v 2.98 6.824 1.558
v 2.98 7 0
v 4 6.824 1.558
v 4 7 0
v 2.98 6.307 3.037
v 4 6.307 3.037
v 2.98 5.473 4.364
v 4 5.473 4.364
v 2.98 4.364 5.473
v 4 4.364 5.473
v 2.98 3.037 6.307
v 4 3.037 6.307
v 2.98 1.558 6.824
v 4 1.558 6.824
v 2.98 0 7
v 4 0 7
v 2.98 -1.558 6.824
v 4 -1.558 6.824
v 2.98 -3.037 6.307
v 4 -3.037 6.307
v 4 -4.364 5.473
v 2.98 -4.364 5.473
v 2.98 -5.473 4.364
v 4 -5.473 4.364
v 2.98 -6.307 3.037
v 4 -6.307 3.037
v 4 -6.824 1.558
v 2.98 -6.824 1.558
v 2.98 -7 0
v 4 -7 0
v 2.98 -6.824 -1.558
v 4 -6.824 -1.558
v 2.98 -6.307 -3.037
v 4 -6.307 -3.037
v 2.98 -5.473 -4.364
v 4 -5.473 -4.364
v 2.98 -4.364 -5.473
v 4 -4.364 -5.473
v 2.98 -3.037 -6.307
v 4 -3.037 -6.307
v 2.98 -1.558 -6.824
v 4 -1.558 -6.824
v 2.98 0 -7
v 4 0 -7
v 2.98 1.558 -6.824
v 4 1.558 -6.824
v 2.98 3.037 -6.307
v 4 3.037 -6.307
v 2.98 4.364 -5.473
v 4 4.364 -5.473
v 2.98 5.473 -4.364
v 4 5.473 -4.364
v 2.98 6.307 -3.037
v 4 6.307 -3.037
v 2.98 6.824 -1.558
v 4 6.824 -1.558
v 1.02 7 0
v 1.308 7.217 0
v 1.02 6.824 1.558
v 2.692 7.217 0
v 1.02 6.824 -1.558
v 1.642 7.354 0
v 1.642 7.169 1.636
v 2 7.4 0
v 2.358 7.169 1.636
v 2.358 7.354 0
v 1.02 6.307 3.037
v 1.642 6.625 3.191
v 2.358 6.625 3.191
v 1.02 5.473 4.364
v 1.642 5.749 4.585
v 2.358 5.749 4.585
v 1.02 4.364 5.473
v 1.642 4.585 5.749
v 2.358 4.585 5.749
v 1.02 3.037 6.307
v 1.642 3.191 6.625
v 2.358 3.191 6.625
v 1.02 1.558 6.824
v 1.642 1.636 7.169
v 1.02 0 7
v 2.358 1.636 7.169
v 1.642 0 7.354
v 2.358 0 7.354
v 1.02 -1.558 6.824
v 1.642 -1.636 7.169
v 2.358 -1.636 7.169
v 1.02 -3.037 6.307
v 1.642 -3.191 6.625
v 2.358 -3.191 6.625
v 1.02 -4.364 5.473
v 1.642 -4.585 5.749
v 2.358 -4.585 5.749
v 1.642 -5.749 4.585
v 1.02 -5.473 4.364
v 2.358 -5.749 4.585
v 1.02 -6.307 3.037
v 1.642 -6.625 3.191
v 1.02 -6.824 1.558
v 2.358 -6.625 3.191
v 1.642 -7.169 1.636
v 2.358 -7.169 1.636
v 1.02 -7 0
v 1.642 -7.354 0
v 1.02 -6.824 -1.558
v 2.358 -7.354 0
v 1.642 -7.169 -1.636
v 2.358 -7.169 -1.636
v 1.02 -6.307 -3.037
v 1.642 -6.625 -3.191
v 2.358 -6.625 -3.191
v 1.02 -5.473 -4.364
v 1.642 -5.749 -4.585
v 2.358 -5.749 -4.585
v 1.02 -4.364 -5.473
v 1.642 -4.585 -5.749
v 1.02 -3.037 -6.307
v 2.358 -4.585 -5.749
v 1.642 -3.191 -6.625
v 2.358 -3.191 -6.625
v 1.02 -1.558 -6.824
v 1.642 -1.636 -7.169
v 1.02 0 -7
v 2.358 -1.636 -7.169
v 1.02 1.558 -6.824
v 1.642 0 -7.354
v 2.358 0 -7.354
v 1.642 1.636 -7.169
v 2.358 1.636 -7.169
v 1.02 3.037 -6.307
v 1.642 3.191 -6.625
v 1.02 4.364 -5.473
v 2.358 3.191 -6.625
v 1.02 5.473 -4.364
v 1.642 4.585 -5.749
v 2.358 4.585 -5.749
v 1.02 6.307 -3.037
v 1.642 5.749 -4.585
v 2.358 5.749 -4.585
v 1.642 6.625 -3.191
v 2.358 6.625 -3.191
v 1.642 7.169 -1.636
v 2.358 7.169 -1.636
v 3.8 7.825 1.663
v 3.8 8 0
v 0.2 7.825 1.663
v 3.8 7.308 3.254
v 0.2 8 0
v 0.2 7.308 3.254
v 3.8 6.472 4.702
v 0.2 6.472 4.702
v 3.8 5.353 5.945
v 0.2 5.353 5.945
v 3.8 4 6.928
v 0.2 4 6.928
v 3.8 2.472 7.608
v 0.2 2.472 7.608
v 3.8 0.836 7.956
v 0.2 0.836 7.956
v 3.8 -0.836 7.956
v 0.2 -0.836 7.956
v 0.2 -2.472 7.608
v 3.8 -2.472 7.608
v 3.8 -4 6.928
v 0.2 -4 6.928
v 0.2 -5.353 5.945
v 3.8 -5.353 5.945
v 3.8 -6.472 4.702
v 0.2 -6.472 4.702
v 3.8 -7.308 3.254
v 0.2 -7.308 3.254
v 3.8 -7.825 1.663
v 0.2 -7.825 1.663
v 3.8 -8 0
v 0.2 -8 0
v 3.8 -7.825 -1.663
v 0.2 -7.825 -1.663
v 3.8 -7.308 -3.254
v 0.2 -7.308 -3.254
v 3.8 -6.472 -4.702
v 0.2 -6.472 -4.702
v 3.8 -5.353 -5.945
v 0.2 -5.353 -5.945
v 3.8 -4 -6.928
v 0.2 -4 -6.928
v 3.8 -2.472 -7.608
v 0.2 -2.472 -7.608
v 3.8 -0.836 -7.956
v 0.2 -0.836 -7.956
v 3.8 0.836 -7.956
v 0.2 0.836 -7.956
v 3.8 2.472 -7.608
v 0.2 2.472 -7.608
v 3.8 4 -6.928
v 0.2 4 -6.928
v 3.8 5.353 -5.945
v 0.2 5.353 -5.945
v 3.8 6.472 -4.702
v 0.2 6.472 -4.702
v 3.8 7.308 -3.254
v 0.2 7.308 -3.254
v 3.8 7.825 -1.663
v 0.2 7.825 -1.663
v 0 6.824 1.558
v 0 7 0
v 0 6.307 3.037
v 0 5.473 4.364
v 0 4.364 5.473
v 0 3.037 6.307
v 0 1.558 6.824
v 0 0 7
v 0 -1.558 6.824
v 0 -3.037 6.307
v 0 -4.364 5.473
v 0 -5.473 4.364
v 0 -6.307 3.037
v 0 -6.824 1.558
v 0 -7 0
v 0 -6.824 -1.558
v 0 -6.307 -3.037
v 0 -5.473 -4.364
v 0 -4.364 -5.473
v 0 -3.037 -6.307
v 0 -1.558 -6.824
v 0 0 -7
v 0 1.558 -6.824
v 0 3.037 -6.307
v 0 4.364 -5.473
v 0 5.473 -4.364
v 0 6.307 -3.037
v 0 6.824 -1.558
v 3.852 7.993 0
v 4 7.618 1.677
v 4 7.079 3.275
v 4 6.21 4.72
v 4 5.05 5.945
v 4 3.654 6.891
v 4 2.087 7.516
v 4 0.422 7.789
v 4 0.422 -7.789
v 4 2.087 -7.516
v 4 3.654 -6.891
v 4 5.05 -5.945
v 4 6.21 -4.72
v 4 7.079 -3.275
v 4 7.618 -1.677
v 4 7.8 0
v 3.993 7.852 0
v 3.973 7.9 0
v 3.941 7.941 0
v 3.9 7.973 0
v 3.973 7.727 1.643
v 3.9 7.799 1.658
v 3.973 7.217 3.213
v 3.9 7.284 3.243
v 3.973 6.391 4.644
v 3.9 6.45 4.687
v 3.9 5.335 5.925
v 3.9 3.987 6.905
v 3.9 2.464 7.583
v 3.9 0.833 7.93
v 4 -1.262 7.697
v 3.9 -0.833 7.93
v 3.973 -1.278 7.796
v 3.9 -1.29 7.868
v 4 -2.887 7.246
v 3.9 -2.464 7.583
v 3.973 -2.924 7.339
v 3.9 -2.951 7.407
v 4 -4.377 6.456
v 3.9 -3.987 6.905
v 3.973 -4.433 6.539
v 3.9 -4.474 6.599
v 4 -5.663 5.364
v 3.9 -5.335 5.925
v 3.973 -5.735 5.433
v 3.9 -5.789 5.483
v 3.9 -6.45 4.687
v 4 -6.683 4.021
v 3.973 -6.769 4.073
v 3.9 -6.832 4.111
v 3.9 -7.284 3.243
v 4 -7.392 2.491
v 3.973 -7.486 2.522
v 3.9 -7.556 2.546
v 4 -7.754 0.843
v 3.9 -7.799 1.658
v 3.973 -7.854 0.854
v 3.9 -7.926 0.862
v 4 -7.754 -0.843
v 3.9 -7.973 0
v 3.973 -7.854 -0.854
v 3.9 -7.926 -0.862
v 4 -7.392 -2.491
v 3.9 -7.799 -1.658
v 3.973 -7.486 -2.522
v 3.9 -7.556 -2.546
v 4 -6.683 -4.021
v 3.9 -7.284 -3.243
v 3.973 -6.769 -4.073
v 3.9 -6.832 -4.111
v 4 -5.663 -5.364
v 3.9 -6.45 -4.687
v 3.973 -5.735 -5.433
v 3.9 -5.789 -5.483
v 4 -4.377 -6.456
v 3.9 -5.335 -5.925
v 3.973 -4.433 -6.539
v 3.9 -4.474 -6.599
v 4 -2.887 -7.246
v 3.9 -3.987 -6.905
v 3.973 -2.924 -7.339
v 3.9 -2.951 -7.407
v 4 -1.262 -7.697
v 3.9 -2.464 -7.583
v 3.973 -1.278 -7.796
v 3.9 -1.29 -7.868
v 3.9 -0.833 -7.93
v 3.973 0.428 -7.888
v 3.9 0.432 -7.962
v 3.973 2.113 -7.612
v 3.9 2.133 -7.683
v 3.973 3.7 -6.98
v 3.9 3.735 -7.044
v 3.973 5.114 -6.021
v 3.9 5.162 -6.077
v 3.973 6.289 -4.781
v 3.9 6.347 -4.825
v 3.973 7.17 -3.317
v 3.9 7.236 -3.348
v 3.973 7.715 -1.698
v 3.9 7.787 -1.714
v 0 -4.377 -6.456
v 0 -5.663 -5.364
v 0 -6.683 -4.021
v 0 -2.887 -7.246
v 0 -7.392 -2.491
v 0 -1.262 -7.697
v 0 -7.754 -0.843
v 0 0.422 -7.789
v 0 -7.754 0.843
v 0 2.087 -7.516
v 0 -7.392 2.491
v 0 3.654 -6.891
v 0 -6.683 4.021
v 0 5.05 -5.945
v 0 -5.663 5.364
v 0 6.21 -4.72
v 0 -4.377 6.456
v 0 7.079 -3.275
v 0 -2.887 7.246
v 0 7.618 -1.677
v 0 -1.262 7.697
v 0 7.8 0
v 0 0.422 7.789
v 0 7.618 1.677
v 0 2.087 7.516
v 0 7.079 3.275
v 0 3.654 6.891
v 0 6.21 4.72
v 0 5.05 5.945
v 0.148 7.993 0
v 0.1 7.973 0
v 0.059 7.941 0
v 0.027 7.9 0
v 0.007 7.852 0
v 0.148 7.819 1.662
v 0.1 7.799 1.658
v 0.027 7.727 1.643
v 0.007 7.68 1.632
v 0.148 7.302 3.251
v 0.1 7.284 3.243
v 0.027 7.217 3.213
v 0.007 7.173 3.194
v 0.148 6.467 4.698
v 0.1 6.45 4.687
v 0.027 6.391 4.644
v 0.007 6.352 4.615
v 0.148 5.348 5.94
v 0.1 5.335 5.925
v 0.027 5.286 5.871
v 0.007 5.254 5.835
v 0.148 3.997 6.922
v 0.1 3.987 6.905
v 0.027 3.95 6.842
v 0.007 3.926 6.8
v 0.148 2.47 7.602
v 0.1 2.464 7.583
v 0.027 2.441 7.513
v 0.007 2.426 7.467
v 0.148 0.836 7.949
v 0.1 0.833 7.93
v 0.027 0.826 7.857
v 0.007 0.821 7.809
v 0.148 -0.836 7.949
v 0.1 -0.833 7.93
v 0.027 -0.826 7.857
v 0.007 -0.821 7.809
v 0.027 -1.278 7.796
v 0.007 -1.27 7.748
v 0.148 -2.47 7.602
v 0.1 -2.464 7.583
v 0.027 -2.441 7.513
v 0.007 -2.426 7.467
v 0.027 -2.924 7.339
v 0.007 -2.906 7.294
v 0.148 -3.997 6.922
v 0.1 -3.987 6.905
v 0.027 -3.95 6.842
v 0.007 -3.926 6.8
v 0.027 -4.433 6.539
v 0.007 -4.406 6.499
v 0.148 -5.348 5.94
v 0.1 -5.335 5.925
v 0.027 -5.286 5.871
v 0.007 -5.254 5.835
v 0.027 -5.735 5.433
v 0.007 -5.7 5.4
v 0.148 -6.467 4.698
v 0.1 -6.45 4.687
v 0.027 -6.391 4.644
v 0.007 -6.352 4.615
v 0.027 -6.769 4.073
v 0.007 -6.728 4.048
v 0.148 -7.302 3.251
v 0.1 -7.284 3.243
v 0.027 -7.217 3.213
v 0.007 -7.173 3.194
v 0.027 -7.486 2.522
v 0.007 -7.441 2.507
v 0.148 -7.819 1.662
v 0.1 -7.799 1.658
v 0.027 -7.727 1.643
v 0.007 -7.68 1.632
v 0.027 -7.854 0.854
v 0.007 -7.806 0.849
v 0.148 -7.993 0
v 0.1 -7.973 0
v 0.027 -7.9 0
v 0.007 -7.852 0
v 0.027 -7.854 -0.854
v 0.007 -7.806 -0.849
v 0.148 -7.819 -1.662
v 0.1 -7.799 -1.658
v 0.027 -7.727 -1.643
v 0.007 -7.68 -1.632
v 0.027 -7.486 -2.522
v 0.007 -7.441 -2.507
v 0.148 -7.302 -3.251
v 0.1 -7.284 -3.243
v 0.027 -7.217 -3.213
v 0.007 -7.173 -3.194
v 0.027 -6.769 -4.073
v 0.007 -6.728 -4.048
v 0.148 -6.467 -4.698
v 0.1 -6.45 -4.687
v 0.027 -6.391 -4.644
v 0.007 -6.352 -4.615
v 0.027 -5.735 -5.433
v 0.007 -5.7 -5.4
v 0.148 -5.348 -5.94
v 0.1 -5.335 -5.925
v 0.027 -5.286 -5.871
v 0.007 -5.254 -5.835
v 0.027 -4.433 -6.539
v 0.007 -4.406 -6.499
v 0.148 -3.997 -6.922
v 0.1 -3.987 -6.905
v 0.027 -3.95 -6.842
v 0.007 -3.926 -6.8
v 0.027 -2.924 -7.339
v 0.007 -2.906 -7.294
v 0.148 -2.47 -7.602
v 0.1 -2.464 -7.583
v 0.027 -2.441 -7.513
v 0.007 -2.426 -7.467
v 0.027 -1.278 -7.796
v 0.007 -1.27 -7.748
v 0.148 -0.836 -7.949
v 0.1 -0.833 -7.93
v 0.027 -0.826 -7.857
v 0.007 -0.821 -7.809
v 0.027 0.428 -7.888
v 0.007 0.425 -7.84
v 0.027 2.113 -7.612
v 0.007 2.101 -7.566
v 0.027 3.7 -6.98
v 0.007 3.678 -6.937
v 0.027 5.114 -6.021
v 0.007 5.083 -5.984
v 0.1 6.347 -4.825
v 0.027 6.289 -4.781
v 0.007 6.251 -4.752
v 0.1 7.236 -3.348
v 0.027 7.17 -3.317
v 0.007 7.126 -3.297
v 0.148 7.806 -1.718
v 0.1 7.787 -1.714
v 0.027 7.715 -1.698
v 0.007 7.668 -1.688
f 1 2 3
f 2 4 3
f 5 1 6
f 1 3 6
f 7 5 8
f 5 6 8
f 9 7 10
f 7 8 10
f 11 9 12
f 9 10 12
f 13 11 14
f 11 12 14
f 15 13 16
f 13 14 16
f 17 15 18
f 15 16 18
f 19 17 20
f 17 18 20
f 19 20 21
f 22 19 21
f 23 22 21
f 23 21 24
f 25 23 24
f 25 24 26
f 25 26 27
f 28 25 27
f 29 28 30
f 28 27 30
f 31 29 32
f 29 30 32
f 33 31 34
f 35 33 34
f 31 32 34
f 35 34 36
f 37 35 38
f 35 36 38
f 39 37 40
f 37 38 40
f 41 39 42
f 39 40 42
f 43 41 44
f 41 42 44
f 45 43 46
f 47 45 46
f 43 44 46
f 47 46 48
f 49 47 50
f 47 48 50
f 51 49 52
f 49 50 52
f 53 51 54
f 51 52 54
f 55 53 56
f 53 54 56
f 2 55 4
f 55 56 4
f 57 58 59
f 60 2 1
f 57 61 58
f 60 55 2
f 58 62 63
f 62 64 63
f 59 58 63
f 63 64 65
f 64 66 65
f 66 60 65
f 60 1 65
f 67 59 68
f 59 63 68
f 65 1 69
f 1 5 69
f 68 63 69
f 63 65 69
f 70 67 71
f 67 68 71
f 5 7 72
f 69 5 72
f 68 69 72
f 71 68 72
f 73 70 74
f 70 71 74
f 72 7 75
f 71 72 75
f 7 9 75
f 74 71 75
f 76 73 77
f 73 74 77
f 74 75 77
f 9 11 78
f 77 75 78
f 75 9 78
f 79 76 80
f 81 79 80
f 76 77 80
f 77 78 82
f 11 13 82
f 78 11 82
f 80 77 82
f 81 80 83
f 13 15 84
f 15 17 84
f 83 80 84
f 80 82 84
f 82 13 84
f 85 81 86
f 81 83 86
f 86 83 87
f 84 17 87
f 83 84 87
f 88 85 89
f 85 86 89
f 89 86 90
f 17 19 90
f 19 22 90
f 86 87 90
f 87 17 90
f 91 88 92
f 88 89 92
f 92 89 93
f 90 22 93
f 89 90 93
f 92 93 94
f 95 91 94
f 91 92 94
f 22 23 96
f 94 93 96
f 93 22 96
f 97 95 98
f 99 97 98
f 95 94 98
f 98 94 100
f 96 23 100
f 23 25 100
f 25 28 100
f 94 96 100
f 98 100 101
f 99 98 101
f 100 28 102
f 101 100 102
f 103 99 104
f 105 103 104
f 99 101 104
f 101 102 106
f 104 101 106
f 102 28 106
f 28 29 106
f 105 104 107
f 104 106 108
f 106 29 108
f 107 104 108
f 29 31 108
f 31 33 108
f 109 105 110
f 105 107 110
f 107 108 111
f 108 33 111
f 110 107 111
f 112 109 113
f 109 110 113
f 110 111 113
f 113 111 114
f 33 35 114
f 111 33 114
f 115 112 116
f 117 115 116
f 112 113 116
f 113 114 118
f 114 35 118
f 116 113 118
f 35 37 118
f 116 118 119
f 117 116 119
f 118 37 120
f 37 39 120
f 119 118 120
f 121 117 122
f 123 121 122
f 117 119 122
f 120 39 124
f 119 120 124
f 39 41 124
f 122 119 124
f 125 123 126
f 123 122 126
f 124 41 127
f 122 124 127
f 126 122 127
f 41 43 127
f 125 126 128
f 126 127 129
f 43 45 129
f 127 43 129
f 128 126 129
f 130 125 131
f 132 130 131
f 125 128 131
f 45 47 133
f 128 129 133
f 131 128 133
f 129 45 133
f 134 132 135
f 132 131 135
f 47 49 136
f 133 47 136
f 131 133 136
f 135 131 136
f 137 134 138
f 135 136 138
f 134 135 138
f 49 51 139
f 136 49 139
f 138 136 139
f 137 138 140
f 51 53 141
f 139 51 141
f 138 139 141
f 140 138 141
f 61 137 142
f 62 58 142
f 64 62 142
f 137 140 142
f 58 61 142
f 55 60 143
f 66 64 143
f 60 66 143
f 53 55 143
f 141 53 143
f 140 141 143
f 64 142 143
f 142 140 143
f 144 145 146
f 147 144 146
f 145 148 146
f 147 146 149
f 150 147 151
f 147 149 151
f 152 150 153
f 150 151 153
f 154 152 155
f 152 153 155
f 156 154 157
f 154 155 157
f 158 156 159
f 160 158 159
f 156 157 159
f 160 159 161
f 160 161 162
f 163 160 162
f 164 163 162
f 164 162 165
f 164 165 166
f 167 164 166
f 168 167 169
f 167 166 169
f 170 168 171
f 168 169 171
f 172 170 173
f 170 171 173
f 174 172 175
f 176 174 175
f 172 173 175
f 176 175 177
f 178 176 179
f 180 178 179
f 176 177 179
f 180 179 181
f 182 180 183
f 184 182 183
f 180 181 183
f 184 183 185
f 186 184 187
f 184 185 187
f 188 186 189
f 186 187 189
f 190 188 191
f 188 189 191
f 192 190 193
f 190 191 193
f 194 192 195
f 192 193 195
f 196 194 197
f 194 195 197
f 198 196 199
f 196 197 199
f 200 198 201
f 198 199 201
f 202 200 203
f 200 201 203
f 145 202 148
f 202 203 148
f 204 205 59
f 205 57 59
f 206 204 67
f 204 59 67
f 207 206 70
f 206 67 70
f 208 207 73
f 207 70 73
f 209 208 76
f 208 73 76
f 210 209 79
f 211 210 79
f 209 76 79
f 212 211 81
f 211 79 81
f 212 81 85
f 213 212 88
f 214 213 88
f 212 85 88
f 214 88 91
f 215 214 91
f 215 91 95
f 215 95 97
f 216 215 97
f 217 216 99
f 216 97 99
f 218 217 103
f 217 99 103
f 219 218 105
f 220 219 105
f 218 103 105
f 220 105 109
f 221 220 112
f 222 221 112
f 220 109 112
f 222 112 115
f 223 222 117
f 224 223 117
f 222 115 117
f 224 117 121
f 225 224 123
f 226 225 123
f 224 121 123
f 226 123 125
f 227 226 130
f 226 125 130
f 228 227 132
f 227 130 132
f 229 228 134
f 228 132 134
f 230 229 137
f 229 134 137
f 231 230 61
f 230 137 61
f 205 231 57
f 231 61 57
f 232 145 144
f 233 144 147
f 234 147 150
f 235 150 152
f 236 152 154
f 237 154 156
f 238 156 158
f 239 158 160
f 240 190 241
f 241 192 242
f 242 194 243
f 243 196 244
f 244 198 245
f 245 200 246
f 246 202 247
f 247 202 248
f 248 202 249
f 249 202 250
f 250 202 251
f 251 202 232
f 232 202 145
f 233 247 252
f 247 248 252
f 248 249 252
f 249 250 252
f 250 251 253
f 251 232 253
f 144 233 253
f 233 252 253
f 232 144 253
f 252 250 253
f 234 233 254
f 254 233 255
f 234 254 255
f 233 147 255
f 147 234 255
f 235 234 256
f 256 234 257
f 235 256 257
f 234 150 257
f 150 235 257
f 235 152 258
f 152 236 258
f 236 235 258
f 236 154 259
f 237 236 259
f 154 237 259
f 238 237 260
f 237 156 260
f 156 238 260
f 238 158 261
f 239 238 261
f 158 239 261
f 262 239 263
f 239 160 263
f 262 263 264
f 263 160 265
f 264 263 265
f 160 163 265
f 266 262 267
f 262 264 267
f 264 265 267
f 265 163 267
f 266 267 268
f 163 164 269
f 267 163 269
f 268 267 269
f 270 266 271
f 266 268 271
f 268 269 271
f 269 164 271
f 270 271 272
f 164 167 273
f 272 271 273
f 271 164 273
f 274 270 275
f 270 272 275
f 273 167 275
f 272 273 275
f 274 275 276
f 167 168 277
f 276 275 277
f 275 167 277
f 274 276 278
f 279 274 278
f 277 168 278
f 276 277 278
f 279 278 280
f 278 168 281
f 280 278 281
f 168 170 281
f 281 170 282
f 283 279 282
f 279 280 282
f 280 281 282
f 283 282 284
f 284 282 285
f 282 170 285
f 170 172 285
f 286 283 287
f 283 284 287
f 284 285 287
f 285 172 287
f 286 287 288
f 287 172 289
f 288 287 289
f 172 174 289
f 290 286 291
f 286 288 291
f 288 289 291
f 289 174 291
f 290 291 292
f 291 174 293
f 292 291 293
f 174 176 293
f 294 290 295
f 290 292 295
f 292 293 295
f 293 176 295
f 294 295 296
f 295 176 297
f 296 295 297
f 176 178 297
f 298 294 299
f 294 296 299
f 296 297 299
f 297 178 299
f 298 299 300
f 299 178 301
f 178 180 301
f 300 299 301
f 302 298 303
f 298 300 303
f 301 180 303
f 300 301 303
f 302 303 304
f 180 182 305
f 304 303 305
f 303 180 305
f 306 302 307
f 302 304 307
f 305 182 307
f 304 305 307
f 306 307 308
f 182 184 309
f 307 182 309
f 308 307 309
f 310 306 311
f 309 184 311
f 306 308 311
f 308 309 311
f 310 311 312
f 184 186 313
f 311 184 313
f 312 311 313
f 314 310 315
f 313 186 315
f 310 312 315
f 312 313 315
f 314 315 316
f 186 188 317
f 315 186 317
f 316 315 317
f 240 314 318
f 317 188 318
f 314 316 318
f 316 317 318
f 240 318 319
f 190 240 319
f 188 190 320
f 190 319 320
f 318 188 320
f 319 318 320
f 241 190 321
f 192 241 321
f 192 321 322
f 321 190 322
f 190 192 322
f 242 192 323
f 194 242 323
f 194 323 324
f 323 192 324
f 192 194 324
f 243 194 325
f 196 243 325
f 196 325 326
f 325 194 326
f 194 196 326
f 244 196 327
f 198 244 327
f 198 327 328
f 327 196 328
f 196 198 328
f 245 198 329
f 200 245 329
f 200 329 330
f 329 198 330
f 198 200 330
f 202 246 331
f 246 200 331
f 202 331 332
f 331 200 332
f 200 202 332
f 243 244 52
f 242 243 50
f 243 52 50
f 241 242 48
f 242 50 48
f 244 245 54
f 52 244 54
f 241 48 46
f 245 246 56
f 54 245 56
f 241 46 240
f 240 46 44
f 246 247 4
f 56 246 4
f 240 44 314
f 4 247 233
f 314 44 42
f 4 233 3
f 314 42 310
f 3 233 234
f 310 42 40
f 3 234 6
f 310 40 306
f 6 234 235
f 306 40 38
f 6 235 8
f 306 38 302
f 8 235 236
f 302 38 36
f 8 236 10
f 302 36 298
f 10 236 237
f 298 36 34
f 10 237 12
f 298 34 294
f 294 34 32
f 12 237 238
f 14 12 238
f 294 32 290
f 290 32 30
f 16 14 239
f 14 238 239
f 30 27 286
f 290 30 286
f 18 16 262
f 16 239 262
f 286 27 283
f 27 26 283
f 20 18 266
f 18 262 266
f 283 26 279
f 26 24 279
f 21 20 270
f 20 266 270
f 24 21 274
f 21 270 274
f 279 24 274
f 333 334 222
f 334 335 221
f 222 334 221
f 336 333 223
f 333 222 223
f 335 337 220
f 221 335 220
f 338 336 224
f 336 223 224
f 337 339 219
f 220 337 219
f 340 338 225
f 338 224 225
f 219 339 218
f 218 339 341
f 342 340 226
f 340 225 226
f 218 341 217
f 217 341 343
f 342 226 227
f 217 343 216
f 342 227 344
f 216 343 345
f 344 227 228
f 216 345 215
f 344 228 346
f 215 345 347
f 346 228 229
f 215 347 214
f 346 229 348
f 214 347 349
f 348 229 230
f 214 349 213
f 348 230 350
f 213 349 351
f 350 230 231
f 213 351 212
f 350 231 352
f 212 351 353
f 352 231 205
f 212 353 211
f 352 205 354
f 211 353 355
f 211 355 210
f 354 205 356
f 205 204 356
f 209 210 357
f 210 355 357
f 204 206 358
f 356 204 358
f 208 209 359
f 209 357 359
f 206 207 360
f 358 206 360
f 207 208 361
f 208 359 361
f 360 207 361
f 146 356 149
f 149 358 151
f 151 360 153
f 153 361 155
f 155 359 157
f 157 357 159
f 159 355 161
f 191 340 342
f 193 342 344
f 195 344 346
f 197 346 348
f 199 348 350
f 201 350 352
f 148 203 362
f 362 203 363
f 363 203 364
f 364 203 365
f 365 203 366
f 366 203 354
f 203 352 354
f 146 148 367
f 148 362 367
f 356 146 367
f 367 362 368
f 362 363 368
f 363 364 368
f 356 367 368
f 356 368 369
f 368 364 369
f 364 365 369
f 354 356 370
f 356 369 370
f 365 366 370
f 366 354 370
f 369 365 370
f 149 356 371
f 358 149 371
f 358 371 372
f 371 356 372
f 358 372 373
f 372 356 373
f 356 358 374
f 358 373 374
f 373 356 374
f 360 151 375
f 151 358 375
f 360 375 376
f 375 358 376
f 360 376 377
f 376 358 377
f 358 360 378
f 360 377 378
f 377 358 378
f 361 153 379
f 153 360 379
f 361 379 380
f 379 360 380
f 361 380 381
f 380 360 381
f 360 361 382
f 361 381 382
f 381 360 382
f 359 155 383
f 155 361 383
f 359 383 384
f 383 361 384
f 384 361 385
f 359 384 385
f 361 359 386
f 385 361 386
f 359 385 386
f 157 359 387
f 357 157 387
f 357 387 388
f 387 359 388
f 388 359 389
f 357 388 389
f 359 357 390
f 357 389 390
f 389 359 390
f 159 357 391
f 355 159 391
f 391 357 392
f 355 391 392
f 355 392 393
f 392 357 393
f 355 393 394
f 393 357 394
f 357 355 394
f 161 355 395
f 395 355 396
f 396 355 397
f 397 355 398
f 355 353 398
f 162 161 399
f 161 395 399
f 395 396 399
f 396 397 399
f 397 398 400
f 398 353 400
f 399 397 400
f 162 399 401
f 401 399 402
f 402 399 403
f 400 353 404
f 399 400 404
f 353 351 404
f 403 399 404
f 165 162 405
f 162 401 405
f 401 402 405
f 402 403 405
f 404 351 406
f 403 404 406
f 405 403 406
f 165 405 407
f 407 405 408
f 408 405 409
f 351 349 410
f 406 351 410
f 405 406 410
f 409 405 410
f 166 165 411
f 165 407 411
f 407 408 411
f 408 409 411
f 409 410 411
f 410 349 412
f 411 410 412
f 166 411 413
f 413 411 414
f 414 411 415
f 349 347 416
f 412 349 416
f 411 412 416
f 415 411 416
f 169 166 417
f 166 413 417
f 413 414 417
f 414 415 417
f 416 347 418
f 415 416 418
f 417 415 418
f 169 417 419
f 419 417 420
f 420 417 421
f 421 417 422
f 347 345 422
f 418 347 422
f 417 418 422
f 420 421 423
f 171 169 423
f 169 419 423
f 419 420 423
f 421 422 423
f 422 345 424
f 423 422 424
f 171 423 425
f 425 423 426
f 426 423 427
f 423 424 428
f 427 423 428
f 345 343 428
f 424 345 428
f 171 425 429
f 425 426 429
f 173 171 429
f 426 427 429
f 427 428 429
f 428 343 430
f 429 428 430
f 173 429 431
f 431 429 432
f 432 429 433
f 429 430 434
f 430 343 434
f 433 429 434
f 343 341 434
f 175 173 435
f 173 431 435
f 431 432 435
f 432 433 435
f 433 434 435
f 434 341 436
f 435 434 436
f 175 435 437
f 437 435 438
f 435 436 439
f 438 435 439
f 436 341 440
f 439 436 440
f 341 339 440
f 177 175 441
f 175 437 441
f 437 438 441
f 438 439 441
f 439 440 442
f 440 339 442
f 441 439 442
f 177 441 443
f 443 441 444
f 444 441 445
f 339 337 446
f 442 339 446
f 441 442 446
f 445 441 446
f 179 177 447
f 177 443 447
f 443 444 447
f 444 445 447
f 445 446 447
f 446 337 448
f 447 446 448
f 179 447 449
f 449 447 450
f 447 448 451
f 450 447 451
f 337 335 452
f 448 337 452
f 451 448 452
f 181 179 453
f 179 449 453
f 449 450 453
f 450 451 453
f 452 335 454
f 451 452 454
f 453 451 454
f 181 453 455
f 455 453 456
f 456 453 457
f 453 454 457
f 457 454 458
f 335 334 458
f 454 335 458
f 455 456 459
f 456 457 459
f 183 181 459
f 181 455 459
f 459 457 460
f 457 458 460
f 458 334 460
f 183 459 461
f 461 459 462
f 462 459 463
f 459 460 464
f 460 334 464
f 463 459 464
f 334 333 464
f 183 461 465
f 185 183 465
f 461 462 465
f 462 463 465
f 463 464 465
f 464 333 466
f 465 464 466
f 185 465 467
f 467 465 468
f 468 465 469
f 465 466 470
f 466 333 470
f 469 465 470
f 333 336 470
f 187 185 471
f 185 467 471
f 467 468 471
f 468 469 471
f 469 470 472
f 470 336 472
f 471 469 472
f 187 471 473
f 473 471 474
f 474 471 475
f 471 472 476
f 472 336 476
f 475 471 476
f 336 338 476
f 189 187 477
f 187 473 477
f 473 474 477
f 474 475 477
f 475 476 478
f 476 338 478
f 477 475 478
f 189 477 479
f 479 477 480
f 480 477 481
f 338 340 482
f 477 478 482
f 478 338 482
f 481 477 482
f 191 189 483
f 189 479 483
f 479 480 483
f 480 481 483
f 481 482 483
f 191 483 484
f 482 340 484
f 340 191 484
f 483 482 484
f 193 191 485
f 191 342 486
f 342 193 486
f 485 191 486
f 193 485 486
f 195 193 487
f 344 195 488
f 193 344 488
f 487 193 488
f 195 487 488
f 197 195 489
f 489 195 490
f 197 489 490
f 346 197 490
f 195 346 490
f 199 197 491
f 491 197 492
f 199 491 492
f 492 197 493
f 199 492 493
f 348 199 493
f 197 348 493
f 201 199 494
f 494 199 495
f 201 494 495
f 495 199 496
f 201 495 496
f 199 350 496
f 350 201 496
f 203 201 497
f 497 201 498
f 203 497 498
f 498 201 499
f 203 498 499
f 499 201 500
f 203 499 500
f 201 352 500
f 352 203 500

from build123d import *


with BuildPart() as part:
    # Esquisse1 → Base-Révolution (revolve)
    with BuildSketch(Plane.XY):
        with BuildLine():
            Line((0, 7), (1.020204103, 7))
            ThreePointArc((1.020204103, 7), (2, 7.4), (2.979795897, 7))
            Line((2.979795897, 7), (4, 7))
            Line((4, 7), (4, 7.8))
            ThreePointArc((4, 7.8), (3.941421356, 7.941421356), (3.8, 8))
            Line((3.8, 8), (0.2, 8))
            ThreePointArc((0.2, 8), (0.058578644, 7.941421356), (0, 7.8))
            Line((0, 7.8), (0, 7))
        make_face()
    revolve(axis=Axis((0, 0, 0), (1, 0, 0)))


solid = part.part
